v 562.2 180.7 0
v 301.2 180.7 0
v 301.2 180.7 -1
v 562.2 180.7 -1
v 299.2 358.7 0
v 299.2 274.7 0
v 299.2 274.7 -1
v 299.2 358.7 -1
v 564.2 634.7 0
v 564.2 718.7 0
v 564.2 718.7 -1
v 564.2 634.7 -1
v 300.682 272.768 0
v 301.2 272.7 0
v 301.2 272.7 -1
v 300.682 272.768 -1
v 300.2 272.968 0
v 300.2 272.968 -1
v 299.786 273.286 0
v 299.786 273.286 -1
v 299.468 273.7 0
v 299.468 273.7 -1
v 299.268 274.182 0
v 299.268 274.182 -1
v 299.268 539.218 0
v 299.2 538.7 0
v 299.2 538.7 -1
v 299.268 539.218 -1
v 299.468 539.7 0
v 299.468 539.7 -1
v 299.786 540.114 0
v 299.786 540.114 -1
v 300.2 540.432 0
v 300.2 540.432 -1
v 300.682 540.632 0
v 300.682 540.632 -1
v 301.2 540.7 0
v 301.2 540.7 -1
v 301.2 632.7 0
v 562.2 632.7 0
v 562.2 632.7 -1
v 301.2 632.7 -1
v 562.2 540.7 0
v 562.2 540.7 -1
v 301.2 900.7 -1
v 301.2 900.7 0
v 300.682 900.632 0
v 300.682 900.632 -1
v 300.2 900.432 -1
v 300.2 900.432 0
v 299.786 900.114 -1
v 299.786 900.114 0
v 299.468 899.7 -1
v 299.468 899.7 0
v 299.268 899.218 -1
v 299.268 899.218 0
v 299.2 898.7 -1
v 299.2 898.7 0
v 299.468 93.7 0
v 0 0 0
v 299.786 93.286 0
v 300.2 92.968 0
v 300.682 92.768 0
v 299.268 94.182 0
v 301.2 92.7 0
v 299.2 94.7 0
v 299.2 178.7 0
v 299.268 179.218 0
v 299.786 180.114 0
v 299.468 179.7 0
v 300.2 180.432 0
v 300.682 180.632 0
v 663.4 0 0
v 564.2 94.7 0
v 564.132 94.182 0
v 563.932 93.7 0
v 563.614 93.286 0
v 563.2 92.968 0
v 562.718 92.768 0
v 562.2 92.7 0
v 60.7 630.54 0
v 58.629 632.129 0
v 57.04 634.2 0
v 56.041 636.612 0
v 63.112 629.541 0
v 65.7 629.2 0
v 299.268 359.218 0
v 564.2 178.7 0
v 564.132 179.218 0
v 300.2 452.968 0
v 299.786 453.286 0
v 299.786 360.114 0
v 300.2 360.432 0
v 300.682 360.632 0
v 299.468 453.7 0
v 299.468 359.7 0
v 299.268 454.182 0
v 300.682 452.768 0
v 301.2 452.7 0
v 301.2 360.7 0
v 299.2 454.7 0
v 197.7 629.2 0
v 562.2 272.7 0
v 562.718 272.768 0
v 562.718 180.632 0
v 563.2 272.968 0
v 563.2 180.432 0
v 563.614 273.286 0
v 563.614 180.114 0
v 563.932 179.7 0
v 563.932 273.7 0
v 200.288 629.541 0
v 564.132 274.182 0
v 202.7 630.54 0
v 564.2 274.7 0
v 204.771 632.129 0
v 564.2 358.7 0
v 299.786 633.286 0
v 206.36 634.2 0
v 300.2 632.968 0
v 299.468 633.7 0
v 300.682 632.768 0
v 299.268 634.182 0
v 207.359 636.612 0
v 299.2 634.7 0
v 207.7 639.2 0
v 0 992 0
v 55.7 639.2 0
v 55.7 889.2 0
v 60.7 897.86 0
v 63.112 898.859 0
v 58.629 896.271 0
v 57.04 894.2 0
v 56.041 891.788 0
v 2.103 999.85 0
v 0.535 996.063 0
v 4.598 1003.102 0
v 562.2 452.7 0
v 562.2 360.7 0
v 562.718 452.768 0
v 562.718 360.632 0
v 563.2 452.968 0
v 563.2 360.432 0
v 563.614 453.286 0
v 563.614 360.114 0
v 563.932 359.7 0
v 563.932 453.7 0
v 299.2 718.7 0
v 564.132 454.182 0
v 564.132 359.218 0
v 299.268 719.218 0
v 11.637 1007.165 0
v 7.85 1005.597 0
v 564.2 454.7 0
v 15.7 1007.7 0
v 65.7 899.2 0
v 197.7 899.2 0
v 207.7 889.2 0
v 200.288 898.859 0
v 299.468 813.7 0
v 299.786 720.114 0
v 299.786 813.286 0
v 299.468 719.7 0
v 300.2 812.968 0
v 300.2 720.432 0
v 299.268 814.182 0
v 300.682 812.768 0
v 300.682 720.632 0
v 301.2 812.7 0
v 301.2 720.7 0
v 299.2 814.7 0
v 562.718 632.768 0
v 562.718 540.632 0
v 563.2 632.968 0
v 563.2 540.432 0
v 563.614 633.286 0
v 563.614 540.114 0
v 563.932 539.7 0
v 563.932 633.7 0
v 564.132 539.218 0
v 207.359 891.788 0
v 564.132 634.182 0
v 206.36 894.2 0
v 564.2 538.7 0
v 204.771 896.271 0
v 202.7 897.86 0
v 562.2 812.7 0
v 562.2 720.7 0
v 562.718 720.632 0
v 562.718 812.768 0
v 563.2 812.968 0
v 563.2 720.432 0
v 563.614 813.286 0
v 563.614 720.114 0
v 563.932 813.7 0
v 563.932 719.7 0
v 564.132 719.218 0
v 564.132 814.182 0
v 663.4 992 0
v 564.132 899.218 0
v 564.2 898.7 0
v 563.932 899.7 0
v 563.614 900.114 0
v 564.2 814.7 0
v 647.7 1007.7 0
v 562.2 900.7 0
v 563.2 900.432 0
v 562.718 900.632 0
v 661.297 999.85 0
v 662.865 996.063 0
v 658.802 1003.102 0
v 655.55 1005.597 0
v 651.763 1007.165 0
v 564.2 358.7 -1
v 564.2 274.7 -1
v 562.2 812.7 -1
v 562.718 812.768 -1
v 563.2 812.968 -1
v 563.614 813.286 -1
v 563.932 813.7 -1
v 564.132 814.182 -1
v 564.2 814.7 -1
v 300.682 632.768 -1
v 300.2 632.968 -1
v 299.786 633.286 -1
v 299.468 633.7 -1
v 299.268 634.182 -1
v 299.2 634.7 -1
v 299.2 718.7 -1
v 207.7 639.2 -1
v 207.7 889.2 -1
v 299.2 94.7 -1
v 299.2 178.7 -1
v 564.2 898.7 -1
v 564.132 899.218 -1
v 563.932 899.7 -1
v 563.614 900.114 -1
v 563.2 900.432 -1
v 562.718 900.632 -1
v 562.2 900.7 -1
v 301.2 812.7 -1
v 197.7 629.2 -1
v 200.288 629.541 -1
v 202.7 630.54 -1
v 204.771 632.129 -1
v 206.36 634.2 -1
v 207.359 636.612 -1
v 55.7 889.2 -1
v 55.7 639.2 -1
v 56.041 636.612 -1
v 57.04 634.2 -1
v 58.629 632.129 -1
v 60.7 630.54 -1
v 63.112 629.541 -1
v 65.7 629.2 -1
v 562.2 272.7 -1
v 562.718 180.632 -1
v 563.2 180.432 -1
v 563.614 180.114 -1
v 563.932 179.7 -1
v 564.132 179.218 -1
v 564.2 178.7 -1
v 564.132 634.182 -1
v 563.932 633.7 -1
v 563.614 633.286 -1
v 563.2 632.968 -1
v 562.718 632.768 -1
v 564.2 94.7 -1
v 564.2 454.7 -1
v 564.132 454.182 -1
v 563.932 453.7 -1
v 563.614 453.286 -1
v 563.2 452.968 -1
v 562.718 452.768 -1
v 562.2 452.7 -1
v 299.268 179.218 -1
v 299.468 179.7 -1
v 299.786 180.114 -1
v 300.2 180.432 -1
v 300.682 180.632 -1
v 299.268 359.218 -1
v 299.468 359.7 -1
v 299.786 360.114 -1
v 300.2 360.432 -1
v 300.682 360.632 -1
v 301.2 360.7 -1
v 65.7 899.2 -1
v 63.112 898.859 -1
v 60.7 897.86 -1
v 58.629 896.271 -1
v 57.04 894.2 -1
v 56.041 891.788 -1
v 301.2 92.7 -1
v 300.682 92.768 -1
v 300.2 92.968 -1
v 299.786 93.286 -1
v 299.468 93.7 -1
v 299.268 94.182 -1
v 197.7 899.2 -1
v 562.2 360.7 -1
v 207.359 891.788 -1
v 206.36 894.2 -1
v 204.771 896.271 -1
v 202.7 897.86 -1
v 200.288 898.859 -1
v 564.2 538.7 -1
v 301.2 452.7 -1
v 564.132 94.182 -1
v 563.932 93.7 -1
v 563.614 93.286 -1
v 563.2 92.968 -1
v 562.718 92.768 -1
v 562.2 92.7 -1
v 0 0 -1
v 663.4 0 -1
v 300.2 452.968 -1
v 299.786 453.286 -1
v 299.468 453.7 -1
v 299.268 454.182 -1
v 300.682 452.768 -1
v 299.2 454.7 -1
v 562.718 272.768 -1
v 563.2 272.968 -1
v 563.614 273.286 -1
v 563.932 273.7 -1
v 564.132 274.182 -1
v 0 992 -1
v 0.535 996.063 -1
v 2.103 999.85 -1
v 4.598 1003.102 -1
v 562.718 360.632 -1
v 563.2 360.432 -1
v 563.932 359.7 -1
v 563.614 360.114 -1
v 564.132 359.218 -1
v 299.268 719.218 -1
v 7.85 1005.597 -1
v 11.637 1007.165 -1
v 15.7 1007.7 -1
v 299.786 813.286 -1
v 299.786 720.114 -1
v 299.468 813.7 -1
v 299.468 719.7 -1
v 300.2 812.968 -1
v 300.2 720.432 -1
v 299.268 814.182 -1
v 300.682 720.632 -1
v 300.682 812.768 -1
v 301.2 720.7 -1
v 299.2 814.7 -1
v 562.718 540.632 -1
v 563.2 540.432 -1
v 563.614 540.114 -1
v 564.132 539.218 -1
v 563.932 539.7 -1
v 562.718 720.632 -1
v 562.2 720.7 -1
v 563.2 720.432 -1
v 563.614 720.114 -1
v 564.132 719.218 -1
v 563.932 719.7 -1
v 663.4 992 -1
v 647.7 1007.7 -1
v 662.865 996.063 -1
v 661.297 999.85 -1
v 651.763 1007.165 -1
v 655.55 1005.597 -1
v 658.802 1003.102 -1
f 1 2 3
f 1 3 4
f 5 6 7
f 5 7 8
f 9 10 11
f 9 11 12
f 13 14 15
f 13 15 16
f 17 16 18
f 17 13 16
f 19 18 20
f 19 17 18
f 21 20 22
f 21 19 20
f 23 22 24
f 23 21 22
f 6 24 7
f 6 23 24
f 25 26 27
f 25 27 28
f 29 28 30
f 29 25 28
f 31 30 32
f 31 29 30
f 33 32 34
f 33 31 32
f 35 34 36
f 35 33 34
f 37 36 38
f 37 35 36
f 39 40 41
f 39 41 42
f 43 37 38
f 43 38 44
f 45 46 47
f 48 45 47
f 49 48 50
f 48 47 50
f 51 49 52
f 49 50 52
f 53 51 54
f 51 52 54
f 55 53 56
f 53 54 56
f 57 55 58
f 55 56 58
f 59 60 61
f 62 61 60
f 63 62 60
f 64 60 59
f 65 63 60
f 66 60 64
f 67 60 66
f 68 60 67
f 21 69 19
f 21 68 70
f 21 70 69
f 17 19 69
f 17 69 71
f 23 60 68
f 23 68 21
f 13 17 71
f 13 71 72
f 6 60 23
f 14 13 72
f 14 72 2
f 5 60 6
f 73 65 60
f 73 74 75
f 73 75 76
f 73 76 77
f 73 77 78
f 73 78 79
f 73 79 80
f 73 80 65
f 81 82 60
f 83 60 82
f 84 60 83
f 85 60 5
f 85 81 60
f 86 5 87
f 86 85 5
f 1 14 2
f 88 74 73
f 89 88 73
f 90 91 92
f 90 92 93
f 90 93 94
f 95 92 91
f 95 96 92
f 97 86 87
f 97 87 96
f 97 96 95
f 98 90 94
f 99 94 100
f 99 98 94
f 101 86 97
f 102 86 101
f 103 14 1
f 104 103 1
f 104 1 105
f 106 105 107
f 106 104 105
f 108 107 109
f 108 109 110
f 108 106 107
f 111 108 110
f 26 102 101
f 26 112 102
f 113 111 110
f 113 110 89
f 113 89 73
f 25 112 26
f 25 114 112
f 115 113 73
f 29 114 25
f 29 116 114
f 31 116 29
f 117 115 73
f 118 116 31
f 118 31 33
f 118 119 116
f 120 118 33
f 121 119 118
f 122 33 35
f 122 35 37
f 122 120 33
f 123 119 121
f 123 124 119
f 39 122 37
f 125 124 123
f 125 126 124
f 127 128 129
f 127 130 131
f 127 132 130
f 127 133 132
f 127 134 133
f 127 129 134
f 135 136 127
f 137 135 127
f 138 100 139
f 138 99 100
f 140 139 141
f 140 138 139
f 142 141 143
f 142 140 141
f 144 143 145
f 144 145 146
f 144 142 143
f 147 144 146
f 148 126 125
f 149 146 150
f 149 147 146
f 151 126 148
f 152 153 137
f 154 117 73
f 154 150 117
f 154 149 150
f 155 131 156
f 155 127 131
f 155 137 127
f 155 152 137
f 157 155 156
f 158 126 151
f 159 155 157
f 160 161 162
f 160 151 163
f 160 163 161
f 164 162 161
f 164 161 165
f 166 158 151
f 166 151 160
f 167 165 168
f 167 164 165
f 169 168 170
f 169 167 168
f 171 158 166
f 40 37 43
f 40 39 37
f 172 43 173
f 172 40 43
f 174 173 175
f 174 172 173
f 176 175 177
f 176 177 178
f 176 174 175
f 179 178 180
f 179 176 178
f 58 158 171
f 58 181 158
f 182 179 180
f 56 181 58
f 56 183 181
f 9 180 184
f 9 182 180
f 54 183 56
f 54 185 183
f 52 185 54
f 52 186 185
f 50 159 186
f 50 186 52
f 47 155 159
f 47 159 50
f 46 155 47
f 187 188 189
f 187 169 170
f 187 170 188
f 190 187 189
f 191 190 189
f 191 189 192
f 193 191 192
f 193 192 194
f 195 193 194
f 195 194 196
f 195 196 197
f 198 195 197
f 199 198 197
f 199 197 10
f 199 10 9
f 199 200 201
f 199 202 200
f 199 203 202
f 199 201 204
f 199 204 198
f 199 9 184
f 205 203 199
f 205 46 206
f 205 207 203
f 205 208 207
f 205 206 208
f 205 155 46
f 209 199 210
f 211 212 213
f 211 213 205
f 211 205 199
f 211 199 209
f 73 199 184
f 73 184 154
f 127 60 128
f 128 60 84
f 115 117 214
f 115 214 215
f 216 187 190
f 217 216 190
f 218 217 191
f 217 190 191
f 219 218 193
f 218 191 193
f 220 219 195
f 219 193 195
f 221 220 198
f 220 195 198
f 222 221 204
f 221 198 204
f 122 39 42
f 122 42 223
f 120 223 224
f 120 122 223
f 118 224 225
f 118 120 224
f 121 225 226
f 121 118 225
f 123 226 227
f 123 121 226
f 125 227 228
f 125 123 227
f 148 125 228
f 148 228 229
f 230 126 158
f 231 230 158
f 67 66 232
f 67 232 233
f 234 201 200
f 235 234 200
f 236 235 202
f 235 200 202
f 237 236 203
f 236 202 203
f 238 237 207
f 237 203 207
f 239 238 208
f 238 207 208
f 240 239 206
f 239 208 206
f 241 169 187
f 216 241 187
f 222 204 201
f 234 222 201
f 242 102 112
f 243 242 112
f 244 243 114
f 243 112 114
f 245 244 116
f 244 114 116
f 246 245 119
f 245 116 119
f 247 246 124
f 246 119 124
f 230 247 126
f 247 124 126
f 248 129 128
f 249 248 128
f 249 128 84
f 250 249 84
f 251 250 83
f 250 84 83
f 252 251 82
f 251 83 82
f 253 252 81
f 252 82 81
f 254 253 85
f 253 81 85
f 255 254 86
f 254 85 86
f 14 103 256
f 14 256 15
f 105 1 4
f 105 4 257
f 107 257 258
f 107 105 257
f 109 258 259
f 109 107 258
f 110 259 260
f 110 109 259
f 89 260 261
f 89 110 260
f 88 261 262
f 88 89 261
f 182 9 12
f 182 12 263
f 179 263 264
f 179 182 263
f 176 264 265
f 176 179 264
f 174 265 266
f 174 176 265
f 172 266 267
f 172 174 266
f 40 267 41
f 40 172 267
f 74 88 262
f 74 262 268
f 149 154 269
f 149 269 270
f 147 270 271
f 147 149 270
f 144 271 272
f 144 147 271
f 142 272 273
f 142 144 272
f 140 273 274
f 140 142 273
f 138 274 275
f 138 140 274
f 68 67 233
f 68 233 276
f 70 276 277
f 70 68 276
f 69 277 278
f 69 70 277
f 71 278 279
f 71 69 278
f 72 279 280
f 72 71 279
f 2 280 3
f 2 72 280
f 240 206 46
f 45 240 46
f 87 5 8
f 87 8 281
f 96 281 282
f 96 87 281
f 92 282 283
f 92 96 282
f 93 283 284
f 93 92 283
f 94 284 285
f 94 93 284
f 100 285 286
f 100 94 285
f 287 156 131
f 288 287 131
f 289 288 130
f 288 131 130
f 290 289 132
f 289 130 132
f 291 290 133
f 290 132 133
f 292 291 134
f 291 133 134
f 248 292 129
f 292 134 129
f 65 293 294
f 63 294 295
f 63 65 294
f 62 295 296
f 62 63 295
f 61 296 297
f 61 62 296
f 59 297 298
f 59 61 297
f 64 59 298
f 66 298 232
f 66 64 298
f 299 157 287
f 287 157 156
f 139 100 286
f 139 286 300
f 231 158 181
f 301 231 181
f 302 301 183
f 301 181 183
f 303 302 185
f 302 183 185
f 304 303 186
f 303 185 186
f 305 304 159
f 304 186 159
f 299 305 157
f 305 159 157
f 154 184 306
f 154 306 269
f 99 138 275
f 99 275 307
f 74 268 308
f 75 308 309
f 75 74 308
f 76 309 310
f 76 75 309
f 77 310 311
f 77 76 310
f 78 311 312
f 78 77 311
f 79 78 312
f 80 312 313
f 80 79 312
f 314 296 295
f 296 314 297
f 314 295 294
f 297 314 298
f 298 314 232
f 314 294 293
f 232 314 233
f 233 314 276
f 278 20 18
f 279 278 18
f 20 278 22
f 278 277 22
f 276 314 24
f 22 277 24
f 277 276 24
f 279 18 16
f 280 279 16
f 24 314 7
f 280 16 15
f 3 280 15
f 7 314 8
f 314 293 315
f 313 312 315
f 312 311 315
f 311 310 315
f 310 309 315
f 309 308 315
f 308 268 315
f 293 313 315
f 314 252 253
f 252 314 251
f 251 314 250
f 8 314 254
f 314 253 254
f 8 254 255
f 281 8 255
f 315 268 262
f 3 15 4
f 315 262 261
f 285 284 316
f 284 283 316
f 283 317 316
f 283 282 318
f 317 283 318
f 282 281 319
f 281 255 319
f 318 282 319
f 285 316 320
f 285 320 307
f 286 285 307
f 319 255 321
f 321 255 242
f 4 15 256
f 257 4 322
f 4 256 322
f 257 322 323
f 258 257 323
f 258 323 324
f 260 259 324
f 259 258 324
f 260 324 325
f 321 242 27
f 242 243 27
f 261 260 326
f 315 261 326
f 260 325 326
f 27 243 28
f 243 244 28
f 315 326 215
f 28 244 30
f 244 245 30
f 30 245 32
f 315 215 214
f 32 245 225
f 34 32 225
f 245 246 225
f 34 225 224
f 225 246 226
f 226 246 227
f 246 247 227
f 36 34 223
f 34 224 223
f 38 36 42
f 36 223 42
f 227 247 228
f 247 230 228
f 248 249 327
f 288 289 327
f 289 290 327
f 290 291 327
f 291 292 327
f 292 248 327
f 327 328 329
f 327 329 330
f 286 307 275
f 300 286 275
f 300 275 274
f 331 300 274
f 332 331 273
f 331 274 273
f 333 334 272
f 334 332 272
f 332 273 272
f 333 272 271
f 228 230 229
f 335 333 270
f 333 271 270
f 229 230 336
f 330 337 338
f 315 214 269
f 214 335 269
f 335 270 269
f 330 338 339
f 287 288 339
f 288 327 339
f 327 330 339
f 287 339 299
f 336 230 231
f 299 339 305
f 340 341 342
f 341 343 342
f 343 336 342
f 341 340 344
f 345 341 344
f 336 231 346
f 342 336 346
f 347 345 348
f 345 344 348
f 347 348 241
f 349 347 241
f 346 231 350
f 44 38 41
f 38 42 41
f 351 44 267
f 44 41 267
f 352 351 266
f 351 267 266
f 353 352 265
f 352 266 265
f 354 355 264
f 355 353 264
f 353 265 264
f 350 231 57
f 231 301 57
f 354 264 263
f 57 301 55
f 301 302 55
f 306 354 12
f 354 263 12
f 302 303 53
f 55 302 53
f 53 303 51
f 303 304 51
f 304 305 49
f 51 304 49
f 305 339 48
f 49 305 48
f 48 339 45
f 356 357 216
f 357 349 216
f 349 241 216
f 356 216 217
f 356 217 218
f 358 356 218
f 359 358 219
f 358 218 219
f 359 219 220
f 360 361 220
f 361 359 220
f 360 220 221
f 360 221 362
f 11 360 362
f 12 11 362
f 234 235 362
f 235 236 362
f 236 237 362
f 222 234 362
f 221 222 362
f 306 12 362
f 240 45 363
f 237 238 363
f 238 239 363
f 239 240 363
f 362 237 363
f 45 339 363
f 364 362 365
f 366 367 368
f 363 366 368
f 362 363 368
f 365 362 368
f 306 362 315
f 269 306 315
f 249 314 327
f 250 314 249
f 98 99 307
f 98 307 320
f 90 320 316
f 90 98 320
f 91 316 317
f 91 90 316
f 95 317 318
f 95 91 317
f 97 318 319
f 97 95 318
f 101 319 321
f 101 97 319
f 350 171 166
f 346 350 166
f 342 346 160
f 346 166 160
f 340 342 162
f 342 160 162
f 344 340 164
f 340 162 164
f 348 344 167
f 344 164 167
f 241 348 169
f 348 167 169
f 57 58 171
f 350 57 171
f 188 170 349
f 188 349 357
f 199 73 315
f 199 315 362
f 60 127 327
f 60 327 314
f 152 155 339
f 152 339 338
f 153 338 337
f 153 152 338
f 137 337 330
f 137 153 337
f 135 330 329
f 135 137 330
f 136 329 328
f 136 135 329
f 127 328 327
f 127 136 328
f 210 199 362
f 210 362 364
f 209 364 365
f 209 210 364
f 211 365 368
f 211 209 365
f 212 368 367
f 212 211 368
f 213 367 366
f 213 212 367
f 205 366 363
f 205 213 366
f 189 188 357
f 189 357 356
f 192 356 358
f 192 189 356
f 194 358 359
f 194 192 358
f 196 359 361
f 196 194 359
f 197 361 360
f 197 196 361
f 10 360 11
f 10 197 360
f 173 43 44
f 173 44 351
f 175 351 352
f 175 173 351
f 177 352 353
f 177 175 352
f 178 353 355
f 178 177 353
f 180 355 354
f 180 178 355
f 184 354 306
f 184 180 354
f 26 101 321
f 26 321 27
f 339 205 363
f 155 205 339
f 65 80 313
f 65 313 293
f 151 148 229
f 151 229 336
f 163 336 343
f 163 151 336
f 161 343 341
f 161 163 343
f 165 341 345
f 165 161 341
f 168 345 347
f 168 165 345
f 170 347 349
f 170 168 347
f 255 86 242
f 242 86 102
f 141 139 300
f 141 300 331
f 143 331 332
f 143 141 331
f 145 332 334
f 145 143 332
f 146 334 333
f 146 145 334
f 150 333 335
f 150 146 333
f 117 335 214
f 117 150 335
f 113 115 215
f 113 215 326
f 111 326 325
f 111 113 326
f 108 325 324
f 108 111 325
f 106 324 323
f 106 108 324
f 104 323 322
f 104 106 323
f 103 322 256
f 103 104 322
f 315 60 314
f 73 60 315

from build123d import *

# Parameters (mm, degrees)
BASE_FLANGE1_DEPTH = 1
CUT_EXTRUDE1_DEPTH = 10
CUT_EXTRUDE2_DEPTH = 10


# Sheet-metal steps are written as plain solids
with BuildPart() as part:
    # Sketch1 → Base-Flange1 (new body)
    with BuildSketch(Plane.XY):
        with BuildLine():
            Line((0, 0), (663.4, 0))
            Line((663.4, 0), (663.4, 992))
            ThreePointArc((663.4, 992), (658.801576465, 1003.101576465), (647.7, 1007.7))
            Line((647.7, 1007.7), (15.7, 1007.7))
            ThreePointArc((15.7, 1007.7), (4.598423535, 1003.101576465), (0, 992))
            Line((0, 992), (0, 0))
        make_face()
    extrude(amount=-BASE_FLANGE1_DEPTH)

    # Sketch9 → Cut-Extrude1 (cut)
    with BuildSketch(Plane.XY):
        with BuildLine():
            Line((562.2, 900.7), (301.2, 900.7))
            ThreePointArc((301.2, 900.7), (299.785786438, 900.114213562), (299.2, 898.7))
            Line((299.2, 898.7), (299.2, 814.7))
            ThreePointArc((299.2, 814.7), (299.785786438, 813.285786438), (301.2, 812.7))
            Line((301.2, 812.7), (562.2, 812.7))
            ThreePointArc((562.2, 812.7), (563.614213562, 813.285786438), (564.2, 814.7))
            Line((564.2, 814.7), (564.2, 898.7))
            ThreePointArc((564.2, 898.7), (563.614213562, 900.114213562), (562.2, 900.7))
        make_face()
        with BuildLine():
            Line((564.2, 718.7), (564.2, 634.7))
            ThreePointArc((564.2, 634.7), (563.614213562, 633.285786438), (562.2, 632.7))
            Line((562.2, 632.7), (301.2, 632.7))
            ThreePointArc((301.2, 632.7), (299.785786438, 633.285786438), (299.2, 634.7))
            Line((299.2, 634.7), (299.2, 718.7))
            ThreePointArc((299.2, 718.7), (299.785786438, 720.114213562), (301.2, 720.7))
            Line((301.2, 720.7), (562.2, 720.7))
            ThreePointArc((562.2, 720.7), (563.614213562, 720.114213562), (564.2, 718.7))
        make_face()
        with BuildLine():
            Line((564.2, 538.7), (564.2, 454.7))
            ThreePointArc((564.2, 454.7), (563.614213562, 453.285786438), (562.2, 452.7))
            Line((562.2, 452.7), (301.2, 452.7))
            ThreePointArc((301.2, 452.7), (299.785786438, 453.285786438), (299.2, 454.7))
            Line((299.2, 454.7), (299.2, 538.7))
            ThreePointArc((299.2, 538.7), (299.785786438, 540.114213562), (301.2, 540.7))
            Line((301.2, 540.7), (562.2, 540.7))
            ThreePointArc((562.2, 540.7), (563.614213562, 540.114213562), (564.2, 538.7))
        make_face()
        with BuildLine():
            Line((564.2, 358.7), (564.2, 274.7))
            ThreePointArc((564.2, 274.7), (563.614213562, 273.285786438), (562.2, 272.7))
            Line((562.2, 272.7), (301.2, 272.7))
            ThreePointArc((301.2, 272.7), (299.785786438, 273.285786438), (299.2, 274.7))
            Line((299.2, 274.7), (299.2, 358.7))
            ThreePointArc((299.2, 358.7), (299.785786438, 360.114213562), (301.2, 360.7))
            Line((301.2, 360.7), (562.2, 360.7))
            ThreePointArc((562.2, 360.7), (563.614213562, 360.114213562), (564.2, 358.7))
        make_face()
        with BuildLine():
            Line((564.2, 178.7), (564.2, 94.7))
            ThreePointArc((564.2, 94.7), (563.614213562, 93.285786438), (562.2, 92.7))
            Line((562.2, 92.7), (301.2, 92.7))
            ThreePointArc((301.2, 92.7), (299.785786438, 93.285786438), (299.2, 94.7))
            Line((299.2, 94.7), (299.2, 178.7))
            ThreePointArc((299.2, 178.7), (299.785786438, 180.114213562), (301.2, 180.7))
            Line((301.2, 180.7), (562.2, 180.7))
            ThreePointArc((562.2, 180.7), (563.614213562, 180.114213562), (564.2, 178.7))
        make_face()
    extrude(amount=-CUT_EXTRUDE1_DEPTH, mode=Mode.SUBTRACT)

    # Sketch10 → Cut-Extrude2 (cut)
    with BuildSketch(Plane.XY):
        with BuildLine():
            Line((65.7, 629.2), (197.7, 629.2))
            ThreePointArc((197.7, 629.2), (204.771067812, 632.128932188), (207.7, 639.2))
            Line((207.7, 639.2), (207.7, 889.2))
            ThreePointArc((207.7, 889.2), (204.771067812, 896.271067812), (197.7, 899.2))
            Line((197.7, 899.2), (65.7, 899.2))
            ThreePointArc((65.7, 899.2), (58.628932188, 896.271067812), (55.7, 889.2))
            Line((55.7, 889.2), (55.7, 639.2))
            ThreePointArc((55.7, 639.2), (58.628932188, 632.128932188), (65.7, 629.2))
        make_face()
    extrude(amount=-CUT_EXTRUDE2_DEPTH, mode=Mode.SUBTRACT)


solid = part.part
